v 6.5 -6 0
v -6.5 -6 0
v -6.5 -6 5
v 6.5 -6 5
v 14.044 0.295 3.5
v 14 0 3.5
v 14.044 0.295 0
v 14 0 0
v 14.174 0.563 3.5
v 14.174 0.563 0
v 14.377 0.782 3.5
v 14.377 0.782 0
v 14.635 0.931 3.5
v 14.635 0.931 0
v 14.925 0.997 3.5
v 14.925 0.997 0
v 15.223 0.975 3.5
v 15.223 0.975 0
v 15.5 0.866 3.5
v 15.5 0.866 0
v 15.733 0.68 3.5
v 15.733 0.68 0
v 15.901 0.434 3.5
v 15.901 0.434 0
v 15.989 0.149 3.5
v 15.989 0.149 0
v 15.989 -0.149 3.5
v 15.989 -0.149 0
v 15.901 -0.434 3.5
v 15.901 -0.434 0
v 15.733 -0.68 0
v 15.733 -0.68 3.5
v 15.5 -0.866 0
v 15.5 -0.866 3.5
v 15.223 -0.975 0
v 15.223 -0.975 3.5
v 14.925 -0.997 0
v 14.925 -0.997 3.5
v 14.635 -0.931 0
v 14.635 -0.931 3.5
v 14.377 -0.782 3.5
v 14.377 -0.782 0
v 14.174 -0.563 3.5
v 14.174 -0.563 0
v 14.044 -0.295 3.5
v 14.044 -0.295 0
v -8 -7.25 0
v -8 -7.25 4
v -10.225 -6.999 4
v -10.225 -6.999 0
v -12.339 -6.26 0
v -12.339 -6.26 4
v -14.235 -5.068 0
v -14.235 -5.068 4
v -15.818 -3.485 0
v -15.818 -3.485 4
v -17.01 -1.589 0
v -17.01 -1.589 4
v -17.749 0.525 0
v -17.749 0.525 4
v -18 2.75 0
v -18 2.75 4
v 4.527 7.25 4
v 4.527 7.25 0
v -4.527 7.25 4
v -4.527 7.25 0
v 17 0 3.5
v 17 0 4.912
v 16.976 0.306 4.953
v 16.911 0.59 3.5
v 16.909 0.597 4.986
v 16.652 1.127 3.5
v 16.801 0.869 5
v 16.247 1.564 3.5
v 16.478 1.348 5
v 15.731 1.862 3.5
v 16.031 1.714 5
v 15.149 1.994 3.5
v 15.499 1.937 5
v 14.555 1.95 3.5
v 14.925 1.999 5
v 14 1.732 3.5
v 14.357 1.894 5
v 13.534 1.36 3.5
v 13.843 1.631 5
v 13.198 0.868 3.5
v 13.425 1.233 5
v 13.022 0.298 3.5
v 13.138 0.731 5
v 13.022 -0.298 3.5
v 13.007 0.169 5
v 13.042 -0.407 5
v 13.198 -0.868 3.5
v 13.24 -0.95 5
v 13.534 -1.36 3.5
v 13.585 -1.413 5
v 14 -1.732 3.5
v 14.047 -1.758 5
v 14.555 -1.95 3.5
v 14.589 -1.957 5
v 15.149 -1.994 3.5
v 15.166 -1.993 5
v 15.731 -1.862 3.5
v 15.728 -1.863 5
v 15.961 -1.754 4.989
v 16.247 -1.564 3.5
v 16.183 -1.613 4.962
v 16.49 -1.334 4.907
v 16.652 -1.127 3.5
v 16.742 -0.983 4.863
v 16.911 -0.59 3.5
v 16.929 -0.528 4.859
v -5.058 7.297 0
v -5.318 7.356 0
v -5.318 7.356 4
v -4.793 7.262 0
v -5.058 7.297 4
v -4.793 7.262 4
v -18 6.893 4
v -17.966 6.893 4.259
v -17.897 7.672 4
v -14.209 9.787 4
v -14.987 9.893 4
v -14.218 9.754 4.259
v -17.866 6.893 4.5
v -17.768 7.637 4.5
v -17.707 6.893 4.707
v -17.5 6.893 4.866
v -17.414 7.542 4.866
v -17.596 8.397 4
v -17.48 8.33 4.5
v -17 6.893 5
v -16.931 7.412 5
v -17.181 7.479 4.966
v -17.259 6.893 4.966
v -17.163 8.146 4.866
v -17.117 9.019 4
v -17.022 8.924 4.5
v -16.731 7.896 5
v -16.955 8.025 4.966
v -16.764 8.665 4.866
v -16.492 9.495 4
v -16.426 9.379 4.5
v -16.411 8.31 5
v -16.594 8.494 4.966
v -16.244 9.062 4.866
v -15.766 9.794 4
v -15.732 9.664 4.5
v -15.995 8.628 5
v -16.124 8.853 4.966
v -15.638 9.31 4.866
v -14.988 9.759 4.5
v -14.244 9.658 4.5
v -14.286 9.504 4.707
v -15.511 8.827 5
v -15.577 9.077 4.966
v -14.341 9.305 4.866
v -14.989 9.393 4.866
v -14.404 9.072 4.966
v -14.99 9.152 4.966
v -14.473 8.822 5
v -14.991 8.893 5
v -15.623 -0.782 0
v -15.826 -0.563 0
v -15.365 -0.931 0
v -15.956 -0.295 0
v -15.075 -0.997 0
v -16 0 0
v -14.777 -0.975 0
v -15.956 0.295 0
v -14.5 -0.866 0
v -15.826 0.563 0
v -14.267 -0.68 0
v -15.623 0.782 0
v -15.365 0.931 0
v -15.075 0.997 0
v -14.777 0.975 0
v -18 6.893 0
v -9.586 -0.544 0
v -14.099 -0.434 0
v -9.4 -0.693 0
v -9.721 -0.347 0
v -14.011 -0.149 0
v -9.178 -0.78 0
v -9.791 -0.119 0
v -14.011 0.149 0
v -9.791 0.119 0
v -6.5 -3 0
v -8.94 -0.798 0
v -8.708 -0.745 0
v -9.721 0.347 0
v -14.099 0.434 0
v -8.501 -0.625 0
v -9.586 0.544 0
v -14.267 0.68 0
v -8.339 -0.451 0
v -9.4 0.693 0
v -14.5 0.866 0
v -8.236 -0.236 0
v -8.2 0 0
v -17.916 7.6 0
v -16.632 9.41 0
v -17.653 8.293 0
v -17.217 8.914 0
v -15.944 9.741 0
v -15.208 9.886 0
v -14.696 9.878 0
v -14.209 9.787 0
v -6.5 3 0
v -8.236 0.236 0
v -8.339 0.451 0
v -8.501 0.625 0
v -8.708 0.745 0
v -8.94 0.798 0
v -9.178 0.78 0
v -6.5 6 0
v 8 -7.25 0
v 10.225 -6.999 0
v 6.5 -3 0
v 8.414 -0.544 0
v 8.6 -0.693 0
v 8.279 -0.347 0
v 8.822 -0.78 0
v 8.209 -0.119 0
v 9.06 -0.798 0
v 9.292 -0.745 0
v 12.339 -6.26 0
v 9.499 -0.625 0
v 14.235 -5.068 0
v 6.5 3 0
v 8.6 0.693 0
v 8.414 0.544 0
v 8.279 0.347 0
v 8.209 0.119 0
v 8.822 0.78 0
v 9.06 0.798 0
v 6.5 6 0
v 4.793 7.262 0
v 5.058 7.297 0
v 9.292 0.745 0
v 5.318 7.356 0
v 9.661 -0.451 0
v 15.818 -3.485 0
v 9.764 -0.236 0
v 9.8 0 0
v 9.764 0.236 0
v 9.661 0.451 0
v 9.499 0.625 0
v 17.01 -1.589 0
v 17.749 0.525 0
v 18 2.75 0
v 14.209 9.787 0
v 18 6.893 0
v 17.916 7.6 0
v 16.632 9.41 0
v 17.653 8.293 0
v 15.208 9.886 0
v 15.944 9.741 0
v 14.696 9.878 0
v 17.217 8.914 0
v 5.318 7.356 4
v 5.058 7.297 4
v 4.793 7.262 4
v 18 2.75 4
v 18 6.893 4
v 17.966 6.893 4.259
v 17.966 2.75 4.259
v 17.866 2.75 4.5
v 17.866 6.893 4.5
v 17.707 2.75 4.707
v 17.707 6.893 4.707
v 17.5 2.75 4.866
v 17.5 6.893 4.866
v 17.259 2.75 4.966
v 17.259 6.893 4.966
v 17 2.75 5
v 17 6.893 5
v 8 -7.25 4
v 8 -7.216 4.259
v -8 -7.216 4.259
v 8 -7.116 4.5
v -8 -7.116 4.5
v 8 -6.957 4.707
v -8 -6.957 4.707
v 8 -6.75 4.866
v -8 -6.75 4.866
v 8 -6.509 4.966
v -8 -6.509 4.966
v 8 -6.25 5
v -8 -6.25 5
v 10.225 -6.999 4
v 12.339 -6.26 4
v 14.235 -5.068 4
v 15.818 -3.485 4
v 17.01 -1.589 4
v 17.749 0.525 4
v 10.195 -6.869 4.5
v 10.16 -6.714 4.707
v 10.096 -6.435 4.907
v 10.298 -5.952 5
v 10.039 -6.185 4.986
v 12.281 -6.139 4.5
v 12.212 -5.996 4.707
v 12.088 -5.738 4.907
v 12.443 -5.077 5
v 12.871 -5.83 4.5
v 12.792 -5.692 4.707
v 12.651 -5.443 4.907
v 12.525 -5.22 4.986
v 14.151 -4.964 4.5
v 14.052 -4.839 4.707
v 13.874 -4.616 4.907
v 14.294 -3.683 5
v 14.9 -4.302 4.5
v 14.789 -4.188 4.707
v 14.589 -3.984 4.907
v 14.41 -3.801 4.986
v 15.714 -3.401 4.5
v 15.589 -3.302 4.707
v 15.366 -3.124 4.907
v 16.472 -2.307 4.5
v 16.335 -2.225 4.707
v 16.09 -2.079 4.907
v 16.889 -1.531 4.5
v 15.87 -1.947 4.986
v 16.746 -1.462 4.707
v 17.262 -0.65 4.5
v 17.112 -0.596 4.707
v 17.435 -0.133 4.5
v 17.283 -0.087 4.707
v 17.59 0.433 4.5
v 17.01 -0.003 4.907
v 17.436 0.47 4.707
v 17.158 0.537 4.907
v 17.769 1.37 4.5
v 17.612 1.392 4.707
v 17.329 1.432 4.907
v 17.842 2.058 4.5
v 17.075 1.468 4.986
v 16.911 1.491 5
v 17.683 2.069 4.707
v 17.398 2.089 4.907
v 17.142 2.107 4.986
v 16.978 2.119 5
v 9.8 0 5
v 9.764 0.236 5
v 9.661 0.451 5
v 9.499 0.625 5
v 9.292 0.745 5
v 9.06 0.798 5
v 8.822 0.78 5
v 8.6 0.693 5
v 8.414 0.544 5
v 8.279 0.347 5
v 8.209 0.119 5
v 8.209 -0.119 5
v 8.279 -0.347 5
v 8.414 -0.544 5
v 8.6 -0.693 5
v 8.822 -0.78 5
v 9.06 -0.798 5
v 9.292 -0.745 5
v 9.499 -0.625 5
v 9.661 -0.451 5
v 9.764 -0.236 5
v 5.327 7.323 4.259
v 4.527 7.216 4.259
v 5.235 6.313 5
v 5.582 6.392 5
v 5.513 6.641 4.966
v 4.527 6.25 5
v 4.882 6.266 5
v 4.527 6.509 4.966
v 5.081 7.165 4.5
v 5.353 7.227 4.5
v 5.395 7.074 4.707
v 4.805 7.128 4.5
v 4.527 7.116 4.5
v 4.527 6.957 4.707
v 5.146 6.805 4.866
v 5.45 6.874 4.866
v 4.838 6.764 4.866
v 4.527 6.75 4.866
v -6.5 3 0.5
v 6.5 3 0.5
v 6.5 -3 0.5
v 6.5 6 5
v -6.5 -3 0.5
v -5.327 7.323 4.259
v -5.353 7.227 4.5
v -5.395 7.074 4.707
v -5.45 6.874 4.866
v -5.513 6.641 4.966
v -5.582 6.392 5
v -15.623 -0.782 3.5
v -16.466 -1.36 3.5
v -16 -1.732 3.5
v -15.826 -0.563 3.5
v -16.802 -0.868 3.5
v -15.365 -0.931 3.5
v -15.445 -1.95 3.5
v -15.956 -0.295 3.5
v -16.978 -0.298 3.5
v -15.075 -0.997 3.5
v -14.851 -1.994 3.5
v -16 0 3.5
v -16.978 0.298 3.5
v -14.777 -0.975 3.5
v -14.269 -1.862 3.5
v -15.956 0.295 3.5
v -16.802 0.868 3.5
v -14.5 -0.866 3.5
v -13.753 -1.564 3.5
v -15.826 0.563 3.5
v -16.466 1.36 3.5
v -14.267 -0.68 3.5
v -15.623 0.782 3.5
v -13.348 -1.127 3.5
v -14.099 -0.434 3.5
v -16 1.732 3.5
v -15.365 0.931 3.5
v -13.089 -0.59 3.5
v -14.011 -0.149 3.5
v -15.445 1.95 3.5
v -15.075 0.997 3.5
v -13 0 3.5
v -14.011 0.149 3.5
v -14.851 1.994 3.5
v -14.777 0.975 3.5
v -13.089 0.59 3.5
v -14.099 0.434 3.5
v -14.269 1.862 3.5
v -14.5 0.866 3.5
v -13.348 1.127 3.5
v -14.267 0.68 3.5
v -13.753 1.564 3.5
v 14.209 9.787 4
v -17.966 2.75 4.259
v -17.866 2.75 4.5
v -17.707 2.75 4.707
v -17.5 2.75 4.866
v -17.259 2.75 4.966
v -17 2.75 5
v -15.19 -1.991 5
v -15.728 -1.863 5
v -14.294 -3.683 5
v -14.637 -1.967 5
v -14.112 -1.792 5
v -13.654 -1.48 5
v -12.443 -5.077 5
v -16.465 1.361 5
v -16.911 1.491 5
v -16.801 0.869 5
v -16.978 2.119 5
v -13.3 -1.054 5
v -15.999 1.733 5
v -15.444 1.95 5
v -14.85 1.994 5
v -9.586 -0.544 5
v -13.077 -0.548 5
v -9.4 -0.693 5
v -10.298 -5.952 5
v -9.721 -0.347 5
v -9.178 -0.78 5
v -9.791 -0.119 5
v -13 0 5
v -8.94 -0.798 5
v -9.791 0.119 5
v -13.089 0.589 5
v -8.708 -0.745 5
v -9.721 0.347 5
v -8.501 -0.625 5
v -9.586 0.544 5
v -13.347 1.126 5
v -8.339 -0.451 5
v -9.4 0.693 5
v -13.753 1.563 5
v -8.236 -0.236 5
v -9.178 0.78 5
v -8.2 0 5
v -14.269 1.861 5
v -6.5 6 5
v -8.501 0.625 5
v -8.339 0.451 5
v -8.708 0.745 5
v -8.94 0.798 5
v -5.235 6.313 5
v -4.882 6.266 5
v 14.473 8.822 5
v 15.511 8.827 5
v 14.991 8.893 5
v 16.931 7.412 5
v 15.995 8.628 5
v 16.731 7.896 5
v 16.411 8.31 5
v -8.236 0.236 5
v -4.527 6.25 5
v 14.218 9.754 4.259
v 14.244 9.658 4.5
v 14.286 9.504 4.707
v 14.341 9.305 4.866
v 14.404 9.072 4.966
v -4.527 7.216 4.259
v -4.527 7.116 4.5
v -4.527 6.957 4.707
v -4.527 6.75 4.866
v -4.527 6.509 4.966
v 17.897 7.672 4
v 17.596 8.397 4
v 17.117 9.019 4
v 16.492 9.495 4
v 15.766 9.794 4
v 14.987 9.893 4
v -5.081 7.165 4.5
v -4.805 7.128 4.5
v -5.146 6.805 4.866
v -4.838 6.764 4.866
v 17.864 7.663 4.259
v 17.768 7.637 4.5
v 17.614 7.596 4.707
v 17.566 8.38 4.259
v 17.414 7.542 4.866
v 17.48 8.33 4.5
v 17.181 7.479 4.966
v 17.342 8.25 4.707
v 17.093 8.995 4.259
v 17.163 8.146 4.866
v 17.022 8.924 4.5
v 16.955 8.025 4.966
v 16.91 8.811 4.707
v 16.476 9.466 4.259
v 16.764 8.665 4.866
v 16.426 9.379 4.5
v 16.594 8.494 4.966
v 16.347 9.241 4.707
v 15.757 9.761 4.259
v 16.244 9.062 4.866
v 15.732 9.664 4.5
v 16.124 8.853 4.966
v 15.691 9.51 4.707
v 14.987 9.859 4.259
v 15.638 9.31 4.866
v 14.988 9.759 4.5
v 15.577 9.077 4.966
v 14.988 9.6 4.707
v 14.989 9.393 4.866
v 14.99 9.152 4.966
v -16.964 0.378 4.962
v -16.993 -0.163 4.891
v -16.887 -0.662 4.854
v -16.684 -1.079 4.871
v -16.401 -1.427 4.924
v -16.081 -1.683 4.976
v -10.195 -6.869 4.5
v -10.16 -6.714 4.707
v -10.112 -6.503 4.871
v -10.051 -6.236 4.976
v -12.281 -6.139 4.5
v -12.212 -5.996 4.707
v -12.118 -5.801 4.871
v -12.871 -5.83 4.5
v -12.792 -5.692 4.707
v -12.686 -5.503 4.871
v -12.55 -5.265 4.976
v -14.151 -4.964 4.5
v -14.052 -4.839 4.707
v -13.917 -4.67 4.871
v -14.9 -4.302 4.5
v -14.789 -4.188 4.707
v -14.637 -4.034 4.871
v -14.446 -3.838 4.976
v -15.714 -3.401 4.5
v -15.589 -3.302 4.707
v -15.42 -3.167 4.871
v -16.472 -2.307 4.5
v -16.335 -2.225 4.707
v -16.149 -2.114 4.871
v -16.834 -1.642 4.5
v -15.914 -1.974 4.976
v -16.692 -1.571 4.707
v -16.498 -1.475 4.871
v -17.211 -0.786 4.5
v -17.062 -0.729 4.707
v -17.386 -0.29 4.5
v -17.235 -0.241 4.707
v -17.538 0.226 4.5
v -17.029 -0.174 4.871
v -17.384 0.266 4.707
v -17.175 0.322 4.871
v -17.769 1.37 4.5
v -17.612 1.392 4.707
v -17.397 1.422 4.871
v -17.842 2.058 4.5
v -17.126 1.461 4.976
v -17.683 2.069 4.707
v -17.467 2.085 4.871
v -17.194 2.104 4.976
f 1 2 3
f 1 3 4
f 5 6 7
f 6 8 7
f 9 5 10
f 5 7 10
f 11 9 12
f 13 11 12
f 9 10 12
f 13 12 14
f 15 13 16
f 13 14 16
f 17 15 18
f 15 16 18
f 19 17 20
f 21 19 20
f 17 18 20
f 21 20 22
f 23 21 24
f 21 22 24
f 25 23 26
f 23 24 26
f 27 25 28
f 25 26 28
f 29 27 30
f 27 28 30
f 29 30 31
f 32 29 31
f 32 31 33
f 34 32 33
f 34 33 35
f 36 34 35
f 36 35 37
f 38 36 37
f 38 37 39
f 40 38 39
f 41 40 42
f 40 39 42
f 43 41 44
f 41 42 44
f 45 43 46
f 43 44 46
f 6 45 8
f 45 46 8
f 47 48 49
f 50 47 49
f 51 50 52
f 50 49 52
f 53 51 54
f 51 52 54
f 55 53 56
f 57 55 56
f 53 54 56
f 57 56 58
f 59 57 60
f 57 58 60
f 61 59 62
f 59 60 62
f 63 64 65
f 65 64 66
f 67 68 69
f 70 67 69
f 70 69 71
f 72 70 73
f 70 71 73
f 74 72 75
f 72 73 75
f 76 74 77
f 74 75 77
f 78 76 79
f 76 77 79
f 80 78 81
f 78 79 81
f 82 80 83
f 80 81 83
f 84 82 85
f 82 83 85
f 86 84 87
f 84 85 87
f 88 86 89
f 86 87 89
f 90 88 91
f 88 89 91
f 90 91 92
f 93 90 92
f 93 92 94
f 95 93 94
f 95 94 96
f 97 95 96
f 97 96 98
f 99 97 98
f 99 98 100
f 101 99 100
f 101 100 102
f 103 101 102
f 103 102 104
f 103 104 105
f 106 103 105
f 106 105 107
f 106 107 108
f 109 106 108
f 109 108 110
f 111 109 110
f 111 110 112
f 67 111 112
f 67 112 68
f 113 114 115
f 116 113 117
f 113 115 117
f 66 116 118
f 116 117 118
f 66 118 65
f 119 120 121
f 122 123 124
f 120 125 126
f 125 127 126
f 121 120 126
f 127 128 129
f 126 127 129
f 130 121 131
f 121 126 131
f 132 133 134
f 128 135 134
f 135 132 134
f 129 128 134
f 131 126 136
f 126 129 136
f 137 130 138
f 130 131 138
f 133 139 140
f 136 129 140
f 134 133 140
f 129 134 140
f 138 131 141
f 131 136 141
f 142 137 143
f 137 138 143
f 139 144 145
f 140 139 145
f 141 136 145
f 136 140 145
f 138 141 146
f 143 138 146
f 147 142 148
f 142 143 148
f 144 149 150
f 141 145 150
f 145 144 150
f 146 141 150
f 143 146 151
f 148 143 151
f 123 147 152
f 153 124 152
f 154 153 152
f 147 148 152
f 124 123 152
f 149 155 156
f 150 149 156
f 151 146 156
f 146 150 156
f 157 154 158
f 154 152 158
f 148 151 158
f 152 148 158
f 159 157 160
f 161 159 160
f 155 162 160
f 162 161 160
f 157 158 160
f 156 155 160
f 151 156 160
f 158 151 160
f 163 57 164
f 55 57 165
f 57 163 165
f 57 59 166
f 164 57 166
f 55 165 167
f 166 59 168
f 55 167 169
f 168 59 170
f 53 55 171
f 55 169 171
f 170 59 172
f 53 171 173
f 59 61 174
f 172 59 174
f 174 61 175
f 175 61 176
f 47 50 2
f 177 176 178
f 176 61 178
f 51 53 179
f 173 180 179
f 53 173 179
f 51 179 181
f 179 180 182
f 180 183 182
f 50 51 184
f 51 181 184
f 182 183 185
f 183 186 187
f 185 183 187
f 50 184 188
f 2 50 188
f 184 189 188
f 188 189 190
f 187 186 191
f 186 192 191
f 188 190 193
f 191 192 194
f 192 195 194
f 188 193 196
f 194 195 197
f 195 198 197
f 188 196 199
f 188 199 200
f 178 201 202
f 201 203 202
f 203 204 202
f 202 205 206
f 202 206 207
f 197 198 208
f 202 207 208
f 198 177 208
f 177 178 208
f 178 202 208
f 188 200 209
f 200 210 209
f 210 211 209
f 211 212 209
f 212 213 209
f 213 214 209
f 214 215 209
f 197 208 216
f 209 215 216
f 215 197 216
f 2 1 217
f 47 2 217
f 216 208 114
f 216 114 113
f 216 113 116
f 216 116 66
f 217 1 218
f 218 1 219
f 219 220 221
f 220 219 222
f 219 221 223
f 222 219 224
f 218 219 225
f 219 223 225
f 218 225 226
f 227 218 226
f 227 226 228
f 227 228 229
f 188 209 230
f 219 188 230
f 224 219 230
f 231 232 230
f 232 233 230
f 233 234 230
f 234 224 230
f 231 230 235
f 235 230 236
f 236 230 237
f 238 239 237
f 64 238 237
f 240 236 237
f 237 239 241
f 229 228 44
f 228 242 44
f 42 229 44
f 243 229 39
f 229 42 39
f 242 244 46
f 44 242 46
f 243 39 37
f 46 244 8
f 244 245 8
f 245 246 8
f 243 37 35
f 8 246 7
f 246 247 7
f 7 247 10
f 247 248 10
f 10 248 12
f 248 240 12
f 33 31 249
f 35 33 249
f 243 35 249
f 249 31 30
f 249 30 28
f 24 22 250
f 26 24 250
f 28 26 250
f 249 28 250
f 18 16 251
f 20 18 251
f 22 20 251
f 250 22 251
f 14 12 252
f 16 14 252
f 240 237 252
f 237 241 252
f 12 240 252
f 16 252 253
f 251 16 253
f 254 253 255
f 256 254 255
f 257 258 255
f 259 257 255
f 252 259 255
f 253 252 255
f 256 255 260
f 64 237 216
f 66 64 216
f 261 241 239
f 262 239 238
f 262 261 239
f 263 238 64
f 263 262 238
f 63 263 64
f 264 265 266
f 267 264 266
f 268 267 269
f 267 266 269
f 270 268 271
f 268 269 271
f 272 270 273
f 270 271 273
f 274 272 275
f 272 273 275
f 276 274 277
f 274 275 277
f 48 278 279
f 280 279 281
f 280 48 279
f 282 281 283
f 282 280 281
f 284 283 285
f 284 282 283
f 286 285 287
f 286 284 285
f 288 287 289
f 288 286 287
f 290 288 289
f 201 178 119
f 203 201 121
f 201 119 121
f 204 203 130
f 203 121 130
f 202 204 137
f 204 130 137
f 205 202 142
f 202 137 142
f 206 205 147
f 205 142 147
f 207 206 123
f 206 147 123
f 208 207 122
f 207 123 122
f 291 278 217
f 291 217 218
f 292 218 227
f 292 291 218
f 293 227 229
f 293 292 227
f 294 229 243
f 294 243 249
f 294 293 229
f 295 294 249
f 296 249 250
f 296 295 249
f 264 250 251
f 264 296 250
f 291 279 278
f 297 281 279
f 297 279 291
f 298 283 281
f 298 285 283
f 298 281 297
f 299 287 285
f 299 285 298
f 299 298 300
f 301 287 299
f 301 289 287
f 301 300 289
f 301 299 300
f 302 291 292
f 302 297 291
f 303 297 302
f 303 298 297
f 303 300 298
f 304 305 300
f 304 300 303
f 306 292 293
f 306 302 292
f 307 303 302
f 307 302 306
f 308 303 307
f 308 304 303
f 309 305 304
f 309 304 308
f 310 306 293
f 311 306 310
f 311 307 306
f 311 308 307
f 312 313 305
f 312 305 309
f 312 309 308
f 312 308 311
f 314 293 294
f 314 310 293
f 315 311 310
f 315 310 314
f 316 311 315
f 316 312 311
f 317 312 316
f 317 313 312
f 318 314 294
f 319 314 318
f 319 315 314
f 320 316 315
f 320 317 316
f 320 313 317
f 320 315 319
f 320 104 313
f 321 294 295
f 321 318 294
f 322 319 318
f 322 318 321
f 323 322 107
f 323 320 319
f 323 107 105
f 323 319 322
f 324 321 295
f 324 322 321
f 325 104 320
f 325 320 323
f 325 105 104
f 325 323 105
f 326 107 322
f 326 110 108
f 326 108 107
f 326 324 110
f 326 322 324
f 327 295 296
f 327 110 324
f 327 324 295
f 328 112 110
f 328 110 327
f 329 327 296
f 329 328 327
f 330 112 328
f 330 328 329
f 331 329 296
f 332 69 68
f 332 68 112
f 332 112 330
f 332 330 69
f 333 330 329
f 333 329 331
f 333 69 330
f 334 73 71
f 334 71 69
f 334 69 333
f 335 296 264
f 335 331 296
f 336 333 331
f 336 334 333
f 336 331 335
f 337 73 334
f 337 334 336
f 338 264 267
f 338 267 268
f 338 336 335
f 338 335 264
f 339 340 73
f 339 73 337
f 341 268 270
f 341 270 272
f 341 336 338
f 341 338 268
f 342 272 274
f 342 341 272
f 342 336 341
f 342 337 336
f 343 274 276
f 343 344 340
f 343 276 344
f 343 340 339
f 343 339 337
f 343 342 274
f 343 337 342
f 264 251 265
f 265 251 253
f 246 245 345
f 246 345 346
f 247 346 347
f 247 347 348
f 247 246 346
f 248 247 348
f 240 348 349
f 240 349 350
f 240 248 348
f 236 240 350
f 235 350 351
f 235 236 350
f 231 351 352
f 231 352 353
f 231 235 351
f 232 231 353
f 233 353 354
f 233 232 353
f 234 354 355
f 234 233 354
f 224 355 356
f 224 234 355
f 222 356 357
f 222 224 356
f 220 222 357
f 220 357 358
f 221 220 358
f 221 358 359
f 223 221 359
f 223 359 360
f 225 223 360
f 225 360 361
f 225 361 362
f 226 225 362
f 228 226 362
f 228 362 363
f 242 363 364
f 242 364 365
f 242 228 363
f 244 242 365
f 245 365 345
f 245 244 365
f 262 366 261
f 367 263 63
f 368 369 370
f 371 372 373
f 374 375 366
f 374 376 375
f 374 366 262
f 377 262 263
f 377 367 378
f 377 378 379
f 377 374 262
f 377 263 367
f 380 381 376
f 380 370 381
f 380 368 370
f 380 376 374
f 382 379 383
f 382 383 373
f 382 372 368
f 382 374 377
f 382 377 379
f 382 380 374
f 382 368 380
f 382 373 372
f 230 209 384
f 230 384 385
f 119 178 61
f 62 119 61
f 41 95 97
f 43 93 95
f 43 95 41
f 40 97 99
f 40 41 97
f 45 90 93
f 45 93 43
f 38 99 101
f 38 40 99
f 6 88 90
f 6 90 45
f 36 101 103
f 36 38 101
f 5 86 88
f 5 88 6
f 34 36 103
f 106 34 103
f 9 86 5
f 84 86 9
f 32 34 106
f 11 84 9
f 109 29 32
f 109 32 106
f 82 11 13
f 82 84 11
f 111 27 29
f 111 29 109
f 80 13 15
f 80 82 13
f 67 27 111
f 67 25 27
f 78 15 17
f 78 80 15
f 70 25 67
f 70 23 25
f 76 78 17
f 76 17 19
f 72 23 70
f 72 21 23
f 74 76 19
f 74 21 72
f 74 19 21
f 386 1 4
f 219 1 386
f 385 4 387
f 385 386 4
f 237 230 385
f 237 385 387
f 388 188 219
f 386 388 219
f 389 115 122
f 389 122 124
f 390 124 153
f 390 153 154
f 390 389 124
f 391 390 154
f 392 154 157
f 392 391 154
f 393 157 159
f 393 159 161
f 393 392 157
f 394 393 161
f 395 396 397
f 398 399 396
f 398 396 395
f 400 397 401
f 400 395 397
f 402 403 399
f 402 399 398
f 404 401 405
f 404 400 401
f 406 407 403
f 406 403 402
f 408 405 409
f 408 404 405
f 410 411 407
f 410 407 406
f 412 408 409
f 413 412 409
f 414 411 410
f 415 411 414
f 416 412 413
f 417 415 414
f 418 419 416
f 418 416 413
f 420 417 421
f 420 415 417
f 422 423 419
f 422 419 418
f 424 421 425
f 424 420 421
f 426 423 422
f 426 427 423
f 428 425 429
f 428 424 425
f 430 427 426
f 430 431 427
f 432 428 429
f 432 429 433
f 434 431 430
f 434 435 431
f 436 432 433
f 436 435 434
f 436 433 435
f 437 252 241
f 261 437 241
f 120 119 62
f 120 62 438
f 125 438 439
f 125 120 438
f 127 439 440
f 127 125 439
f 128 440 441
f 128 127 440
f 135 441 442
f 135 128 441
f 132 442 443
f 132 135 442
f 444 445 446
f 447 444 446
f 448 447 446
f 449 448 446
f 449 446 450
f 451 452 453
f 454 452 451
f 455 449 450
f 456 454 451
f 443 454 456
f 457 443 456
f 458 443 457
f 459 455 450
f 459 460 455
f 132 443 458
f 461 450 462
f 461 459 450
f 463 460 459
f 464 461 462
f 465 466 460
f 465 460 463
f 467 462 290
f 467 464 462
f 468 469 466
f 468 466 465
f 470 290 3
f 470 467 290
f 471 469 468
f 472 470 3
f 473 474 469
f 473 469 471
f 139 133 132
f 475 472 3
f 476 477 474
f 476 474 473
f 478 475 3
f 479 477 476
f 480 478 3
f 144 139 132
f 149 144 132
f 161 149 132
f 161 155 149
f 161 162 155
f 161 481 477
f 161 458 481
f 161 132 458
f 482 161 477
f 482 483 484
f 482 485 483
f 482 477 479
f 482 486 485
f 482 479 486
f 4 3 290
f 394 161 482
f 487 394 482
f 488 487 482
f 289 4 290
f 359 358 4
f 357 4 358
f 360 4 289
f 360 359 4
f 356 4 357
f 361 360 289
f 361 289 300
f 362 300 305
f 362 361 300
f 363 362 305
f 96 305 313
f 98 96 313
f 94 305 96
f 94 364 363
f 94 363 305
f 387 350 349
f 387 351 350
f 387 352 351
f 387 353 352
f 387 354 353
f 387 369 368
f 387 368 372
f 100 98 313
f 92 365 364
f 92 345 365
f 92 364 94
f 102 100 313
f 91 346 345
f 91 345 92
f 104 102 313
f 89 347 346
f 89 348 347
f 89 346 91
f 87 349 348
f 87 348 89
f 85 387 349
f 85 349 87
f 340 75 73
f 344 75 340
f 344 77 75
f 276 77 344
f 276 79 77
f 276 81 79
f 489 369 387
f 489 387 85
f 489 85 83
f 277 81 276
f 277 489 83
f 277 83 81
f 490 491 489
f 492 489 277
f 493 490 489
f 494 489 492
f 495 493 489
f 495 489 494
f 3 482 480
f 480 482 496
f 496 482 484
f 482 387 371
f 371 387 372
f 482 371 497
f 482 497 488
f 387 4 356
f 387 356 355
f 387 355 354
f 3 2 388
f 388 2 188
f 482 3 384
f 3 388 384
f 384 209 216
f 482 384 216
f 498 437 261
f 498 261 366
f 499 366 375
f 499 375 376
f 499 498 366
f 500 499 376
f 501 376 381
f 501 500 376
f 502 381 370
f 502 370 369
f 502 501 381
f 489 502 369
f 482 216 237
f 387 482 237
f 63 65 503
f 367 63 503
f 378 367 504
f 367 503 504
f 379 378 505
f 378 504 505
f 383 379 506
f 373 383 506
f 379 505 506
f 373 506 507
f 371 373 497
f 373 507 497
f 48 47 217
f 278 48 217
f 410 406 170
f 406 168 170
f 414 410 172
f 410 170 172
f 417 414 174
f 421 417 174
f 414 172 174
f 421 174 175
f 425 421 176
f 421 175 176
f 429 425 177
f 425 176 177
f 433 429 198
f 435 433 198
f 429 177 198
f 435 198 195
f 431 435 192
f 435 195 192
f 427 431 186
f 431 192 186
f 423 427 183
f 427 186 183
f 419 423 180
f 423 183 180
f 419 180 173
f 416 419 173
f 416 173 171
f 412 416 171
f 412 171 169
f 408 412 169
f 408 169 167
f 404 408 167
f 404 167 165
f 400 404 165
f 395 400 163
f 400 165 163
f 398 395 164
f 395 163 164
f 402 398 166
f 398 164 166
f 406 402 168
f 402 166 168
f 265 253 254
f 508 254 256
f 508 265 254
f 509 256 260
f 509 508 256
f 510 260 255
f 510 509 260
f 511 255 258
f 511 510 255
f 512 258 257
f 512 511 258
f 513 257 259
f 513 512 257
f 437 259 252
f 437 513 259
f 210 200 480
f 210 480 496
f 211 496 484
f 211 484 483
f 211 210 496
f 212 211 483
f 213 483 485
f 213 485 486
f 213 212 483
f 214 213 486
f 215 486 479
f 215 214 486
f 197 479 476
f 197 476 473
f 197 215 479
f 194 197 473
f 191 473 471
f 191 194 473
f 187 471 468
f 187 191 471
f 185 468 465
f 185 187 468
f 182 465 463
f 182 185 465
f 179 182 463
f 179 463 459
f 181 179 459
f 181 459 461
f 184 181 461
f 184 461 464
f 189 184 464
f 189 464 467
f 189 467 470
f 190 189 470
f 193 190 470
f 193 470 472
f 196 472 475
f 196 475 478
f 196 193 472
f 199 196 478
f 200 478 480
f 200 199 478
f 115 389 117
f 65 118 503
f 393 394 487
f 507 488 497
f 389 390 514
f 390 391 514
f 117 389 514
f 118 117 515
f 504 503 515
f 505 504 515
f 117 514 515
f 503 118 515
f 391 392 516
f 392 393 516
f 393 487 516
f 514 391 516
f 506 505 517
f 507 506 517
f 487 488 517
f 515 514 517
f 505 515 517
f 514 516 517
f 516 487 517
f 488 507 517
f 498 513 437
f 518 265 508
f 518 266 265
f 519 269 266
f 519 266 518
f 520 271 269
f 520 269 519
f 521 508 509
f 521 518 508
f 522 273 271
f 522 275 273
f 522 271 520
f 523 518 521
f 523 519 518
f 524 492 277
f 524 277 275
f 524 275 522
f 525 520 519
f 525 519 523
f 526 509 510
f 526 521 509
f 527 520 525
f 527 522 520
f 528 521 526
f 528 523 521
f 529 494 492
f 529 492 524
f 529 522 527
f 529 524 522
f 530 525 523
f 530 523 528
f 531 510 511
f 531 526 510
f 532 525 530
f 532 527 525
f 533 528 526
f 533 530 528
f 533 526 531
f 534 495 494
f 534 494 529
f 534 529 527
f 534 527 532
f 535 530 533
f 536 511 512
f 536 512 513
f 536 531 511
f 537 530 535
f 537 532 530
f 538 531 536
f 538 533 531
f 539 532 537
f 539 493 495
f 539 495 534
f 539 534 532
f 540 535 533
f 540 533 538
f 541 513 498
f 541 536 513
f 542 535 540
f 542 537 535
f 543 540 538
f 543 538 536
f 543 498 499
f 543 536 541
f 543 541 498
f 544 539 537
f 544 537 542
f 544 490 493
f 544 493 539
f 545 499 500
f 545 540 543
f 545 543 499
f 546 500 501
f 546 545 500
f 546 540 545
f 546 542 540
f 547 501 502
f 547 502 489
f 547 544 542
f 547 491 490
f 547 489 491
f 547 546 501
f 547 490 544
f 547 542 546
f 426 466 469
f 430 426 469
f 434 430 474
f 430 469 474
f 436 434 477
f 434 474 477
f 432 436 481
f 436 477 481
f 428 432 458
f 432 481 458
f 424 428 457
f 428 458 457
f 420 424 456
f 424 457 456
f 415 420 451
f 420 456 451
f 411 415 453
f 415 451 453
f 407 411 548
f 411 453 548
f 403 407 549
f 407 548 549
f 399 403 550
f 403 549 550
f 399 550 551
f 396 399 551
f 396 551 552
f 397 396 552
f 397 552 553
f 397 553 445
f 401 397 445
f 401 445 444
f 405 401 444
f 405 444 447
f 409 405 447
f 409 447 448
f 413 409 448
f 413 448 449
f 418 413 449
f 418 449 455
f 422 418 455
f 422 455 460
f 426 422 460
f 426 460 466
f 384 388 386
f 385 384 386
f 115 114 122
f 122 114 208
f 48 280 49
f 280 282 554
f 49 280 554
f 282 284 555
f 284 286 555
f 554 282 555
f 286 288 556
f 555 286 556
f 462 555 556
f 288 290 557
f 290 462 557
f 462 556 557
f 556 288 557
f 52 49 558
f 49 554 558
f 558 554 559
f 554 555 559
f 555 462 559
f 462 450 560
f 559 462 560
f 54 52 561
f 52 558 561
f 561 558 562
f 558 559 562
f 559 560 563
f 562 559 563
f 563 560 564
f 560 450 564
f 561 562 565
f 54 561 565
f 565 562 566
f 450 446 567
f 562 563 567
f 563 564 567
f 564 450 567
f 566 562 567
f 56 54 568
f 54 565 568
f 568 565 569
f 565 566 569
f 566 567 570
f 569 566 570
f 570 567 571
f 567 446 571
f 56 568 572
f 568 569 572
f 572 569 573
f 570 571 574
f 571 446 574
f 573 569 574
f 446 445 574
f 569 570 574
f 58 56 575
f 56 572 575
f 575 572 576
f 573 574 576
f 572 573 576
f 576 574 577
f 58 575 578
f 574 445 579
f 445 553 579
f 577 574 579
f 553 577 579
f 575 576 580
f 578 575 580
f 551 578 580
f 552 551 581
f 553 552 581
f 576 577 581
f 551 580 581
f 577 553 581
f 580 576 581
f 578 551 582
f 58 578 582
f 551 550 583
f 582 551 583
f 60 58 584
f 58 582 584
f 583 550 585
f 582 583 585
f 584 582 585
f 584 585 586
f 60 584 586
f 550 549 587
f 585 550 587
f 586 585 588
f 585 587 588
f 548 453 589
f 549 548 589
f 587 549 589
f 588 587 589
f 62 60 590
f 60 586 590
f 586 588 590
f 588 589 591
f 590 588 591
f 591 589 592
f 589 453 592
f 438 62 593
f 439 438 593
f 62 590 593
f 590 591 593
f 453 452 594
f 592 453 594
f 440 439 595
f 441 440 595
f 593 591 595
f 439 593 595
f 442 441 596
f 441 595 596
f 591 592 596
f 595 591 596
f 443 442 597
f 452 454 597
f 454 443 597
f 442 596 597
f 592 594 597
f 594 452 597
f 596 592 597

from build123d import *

# Parameters (mm, degrees)
F0_R           = 0.8
F0_W           = 13
F0_H           = 12
F1_DEPTH       = 5
F2_W           = 13
F2_H           = 6
F3_DEPTH       = 0.5
F5_D           = 2
F5_DEPTH       = 20
F5_CBORE_D     = 4
F5_CBORE_DEPTH = 1.5
F5_TIP         = 0.600860619
F6_R           = 10
F7_R           = 3
F8_T1_DEPTH    = 4.1430571099
F8_T3_DEPTH    = 9.217139142
F8_T5_DEPTH    = 16
F8_T7_DEPTH    = 9.0537269763
F8_T9_DEPTH    = 9.217139142
F8_T12_ANGLE   = 90
F8_T14_ANGLE   = 105.2904097565
F8_T16_ANGLE   = 90
F8_T18_ANGLE   = 15.2904100724
F8_T20_ANGLE   = 15.2904100724
F8_T22_ANGLE   = 105.2904094573


# Not quite as in the source:
# - a fillet or chamfer that OpenCascade refuses, or shapes differently, is made with other operations: its cross-section is extruded or revolved along the edge and cut away or added


with BuildPart() as f1:
    # F0 (on Top) → F1 (new body)
    with BuildSketch(Plane.XY):
        Polygon((-18, -7.25), (18, -7.25), (18, 7.25), (4.9295582736, 7.25), (-4.9295582736, 7.25), (-18, 7.25), align=None)
        with Locations((-9, 0)):
            Circle(F0_R, mode=Mode.SUBTRACT)
        Rectangle(F0_W, F0_H, mode=Mode.SUBTRACT)
        with Locations((9, 0)):
            Circle(F0_R, mode=Mode.SUBTRACT)
        with BuildLine():
            Line((4.9295582736, 7.25), (18, 7.25))
            ThreePointArc((18, 7.25), (17.6073787038, 9), (16.5047771245, 10.4145392323))
            Line((16.5047771245, 10.4145392323), (4.9295582736, 7.25))
        make_face()
        with BuildLine():
            ThreePointArc((-16.5047771245, 10.4145392323), (-17.6073787038, 9), (-18, 7.25))
            Line((-18, 7.25), (-4.9295582736, 7.25))
            Line((-4.9295582736, 7.25), (-16.5047771245, 10.4145392323))
        make_face()
    extrude(amount=F1_DEPTH)

    # F2 (on face) → F3 (join)
    with BuildSketch(Plane(origin=(0, 0, 0), x_dir=(1, 0, 0), z_dir=(0, 0, -1))):
        Rectangle(F2_W, F2_H)
    extrude(amount=-F3_DEPTH)

    # F5
    with Locations(Plane.XY.offset(5)):
        with Locations((-15, 0), (15, 0)):
            CounterBoreHole(F5_D / 2, F5_CBORE_D / 2, F5_CBORE_DEPTH, depth=F5_DEPTH)
            with Locations((0, 0, -(F5_DEPTH + F5_TIP / 2))):  # 118° drill point
                Cone(0, F5_D / 2, F5_TIP, mode=Mode.SUBTRACT)

    # F6
    f6_edges = [f1.edges().sort_by_distance(p)[0] for p in [
        (-18, -7.25, 2.5),
        (18, -7.25, 2.5),
    ]]
    fillet(f6_edges, radius=F6_R)

    # F7
    f7_edges = [f1.edges().sort_by_distance(p)[0] for p in [
        (-16.504777, 10.414539, 2.5),
        (16.504777, 10.414539, 2.5),
        (-4.929558, 7.25, 2.5),
        (4.929558, 7.25, 2.5),
    ]]
    fillet(f7_edges, radius=F7_R)

    # F8: fillet of radius 1 on 12 edges, made by hand

    # F8_s2 → F8_t1 (cut)
    with BuildSketch(Plane.XZ.offset(-6.8930571099)):
        with BuildLine():
            ThreePointArc((-18, 4), (-17.7071067812, 4.7071067812), (-17, 5))
            Line((-17, 5), (-18, 5))
            Line((-18, 5), (-18, 4))
        make_face()
        with BuildLine():
            ThreePointArc((18, 4), (17.7071067812, 4.7071067812), (17, 5))
            Line((17, 5), (18, 5))
            Line((18, 5), (18, 4))
        make_face()
    extrude(amount=F8_T1_DEPTH, mode=Mode.SUBTRACT)

    # F8_s4 → F8_t3 (cut)
    with BuildSketch(Plane(origin=(-6.8194085753, 1.8643523078, 0), x_dir=(0, 0, 1), z_dir=(-0.9646015709, 0.2637116027, 0))):
        with BuildLine():
            ThreePointArc((4, 5.6933796762), (4.7071067812, 5.4004864574), (5, 4.6933796762))
            Line((5, 4.6933796762), (5, 5.6933796762))
            Line((5, 5.6933796762), (4, 5.6933796762))
        make_face()
    extrude(amount=F8_T3_DEPTH, mode=Mode.SUBTRACT)

    # F8_s6 → F8_t5 (cut)
    with BuildSketch(Plane.YZ.offset(-8)):
        with BuildLine():
            ThreePointArc((-7.25, 4), (-6.9571067812, 4.7071067812), (-6.25, 5))
            Line((-6.25, 5), (-7.25, 5))
            Line((-7.25, 5), (-7.25, 4))
        make_face()
    extrude(amount=F8_T5_DEPTH, mode=Mode.SUBTRACT)

    # F8_s8 → F8_t7 (cut)
    with BuildSketch(Plane.YZ.offset(-4.5268634881)):
        with BuildLine():
            ThreePointArc((7.25, 4), (6.9571067812, 4.7071067812), (6.25, 5))
            Line((6.25, 5), (7.25, 5))
            Line((7.25, 5), (7.25, 4))
        make_face()
    extrude(amount=F8_T7_DEPTH, mode=Mode.SUBTRACT)

    # F8_s10 → F8_t9 (cut)
    with BuildSketch(Plane(origin=(15.7102754711, 4.2950188431, 0), x_dir=(0, 0, 1), z_dir=(-0.9646015709, -0.2637116027, 0))):
        with BuildLine():
            ThreePointArc((4, 5.6933796762), (4.7071067812, 5.4004864574), (5, 4.6933796762))
            Line((5, 4.6933796762), (5, 5.6933796762))
            Line((5, 5.6933796762), (4, 5.6933796762))
        make_face()
    extrude(amount=F8_T9_DEPTH, mode=Mode.SUBTRACT)

    # F8_s11 → F8_t12 (revolve, cut)
    with BuildSketch(Plane.YZ.offset(8)):
        with BuildLine():
            ThreePointArc((-7.25, 4), (-6.9571067812, 4.7071067812), (-6.25, 5))
            Line((-6.25, 5), (-7.25, 5))
            Line((-7.25, 5), (-7.25, 4))
        make_face()
    revolve(axis=Axis((8, 2.75, 5), (0, 0, 1)), revolution_arc=F8_T12_ANGLE, mode=Mode.SUBTRACT)

    # F8_s13 → F8_t14 (revolve, cut)
    with BuildSketch(Plane.XZ.offset(-6.8930571003)):
        with BuildLine():
            ThreePointArc((-18.0000000058, 4), (-17.707106787, 4.7071067812), (-17.0000000058, 5))
            Line((-17.0000000058, 5), (-18, 5))
            Line((-18, 5), (-18.0000000058, 4))
        make_face()
    revolve(axis=Axis((-14.9999999954, 6.8930571003, 5), (0, 0, -1)), revolution_arc=F8_T14_ANGLE, mode=Mode.SUBTRACT)

    # F8_s15 → F8_t16 (revolve, cut)
    with BuildSketch(Plane.YZ.offset(-8)):
        with BuildLine():
            ThreePointArc((-7.25, 4), (-6.9571067812, 4.7071067812), (-6.25, 5))
            Line((-6.25, 5), (-7.25, 5))
            Line((-7.25, 5), (-7.25, 4))
        make_face()
    revolve(axis=Axis((-8, 2.75, 5), (0, 0, -1)), revolution_arc=F8_T16_ANGLE, mode=Mode.SUBTRACT)

    # F8_s17 → F8_t18 (revolve, cut)
    with BuildSketch(Plane(origin=(-6.8194085753, 1.8643523078, 0), x_dir=(0, 0, 1), z_dir=(-0.9646015709, 0.2637116027, 0))):
        with BuildLine():
            ThreePointArc((4, 5.6933796762), (4.7071067812, 5.4004864574), (5, 4.6933796762))
            Line((5, 4.6933796762), (5, 5.6933796762))
            Line((5, 5.6933796762), (4, 5.6933796762))
        make_face()
    revolve(axis=Axis((-4.5268634881, 10.25, 5), (0, 0, 1)), revolution_arc=F8_T18_ANGLE, mode=Mode.SUBTRACT)

    # F8_s19 → F8_t20 (revolve, cut)
    with BuildSketch(Plane(origin=(6.8194085753, 1.8643523078, 0), x_dir=(0, 0, 1), z_dir=(0.9646015709, 0.2637116027, 0))):
        with BuildLine():
            ThreePointArc((4, -5.6933796762), (4.7071067812, -5.4004864574), (5, -4.6933796762))
            Line((5, -4.6933796762), (5, -5.6933796762))
            Line((5, -5.6933796762), (4, -5.6933796762))
        make_face()
    revolve(axis=Axis((4.5268634881, 10.25, 5), (0, 0, -1)), revolution_arc=F8_T20_ANGLE, mode=Mode.SUBTRACT)

    # F8_s21 → F8_t22 (revolve, cut)
    with BuildSketch(Plane.XZ.offset(-6.8930570951)):
        with BuildLine():
            ThreePointArc((18.0000000063, 4), (17.7071067875, 4.7071067812), (17.0000000063, 5))
            Line((17.0000000063, 5), (18, 5))
            Line((18, 5), (18.0000000063, 4))
        make_face()
    revolve(axis=Axis((14.999999986, 6.8930570951, 5), (0, 0, 1)), revolution_arc=F8_T22_ANGLE, mode=Mode.SUBTRACT)


solid = f1.part
